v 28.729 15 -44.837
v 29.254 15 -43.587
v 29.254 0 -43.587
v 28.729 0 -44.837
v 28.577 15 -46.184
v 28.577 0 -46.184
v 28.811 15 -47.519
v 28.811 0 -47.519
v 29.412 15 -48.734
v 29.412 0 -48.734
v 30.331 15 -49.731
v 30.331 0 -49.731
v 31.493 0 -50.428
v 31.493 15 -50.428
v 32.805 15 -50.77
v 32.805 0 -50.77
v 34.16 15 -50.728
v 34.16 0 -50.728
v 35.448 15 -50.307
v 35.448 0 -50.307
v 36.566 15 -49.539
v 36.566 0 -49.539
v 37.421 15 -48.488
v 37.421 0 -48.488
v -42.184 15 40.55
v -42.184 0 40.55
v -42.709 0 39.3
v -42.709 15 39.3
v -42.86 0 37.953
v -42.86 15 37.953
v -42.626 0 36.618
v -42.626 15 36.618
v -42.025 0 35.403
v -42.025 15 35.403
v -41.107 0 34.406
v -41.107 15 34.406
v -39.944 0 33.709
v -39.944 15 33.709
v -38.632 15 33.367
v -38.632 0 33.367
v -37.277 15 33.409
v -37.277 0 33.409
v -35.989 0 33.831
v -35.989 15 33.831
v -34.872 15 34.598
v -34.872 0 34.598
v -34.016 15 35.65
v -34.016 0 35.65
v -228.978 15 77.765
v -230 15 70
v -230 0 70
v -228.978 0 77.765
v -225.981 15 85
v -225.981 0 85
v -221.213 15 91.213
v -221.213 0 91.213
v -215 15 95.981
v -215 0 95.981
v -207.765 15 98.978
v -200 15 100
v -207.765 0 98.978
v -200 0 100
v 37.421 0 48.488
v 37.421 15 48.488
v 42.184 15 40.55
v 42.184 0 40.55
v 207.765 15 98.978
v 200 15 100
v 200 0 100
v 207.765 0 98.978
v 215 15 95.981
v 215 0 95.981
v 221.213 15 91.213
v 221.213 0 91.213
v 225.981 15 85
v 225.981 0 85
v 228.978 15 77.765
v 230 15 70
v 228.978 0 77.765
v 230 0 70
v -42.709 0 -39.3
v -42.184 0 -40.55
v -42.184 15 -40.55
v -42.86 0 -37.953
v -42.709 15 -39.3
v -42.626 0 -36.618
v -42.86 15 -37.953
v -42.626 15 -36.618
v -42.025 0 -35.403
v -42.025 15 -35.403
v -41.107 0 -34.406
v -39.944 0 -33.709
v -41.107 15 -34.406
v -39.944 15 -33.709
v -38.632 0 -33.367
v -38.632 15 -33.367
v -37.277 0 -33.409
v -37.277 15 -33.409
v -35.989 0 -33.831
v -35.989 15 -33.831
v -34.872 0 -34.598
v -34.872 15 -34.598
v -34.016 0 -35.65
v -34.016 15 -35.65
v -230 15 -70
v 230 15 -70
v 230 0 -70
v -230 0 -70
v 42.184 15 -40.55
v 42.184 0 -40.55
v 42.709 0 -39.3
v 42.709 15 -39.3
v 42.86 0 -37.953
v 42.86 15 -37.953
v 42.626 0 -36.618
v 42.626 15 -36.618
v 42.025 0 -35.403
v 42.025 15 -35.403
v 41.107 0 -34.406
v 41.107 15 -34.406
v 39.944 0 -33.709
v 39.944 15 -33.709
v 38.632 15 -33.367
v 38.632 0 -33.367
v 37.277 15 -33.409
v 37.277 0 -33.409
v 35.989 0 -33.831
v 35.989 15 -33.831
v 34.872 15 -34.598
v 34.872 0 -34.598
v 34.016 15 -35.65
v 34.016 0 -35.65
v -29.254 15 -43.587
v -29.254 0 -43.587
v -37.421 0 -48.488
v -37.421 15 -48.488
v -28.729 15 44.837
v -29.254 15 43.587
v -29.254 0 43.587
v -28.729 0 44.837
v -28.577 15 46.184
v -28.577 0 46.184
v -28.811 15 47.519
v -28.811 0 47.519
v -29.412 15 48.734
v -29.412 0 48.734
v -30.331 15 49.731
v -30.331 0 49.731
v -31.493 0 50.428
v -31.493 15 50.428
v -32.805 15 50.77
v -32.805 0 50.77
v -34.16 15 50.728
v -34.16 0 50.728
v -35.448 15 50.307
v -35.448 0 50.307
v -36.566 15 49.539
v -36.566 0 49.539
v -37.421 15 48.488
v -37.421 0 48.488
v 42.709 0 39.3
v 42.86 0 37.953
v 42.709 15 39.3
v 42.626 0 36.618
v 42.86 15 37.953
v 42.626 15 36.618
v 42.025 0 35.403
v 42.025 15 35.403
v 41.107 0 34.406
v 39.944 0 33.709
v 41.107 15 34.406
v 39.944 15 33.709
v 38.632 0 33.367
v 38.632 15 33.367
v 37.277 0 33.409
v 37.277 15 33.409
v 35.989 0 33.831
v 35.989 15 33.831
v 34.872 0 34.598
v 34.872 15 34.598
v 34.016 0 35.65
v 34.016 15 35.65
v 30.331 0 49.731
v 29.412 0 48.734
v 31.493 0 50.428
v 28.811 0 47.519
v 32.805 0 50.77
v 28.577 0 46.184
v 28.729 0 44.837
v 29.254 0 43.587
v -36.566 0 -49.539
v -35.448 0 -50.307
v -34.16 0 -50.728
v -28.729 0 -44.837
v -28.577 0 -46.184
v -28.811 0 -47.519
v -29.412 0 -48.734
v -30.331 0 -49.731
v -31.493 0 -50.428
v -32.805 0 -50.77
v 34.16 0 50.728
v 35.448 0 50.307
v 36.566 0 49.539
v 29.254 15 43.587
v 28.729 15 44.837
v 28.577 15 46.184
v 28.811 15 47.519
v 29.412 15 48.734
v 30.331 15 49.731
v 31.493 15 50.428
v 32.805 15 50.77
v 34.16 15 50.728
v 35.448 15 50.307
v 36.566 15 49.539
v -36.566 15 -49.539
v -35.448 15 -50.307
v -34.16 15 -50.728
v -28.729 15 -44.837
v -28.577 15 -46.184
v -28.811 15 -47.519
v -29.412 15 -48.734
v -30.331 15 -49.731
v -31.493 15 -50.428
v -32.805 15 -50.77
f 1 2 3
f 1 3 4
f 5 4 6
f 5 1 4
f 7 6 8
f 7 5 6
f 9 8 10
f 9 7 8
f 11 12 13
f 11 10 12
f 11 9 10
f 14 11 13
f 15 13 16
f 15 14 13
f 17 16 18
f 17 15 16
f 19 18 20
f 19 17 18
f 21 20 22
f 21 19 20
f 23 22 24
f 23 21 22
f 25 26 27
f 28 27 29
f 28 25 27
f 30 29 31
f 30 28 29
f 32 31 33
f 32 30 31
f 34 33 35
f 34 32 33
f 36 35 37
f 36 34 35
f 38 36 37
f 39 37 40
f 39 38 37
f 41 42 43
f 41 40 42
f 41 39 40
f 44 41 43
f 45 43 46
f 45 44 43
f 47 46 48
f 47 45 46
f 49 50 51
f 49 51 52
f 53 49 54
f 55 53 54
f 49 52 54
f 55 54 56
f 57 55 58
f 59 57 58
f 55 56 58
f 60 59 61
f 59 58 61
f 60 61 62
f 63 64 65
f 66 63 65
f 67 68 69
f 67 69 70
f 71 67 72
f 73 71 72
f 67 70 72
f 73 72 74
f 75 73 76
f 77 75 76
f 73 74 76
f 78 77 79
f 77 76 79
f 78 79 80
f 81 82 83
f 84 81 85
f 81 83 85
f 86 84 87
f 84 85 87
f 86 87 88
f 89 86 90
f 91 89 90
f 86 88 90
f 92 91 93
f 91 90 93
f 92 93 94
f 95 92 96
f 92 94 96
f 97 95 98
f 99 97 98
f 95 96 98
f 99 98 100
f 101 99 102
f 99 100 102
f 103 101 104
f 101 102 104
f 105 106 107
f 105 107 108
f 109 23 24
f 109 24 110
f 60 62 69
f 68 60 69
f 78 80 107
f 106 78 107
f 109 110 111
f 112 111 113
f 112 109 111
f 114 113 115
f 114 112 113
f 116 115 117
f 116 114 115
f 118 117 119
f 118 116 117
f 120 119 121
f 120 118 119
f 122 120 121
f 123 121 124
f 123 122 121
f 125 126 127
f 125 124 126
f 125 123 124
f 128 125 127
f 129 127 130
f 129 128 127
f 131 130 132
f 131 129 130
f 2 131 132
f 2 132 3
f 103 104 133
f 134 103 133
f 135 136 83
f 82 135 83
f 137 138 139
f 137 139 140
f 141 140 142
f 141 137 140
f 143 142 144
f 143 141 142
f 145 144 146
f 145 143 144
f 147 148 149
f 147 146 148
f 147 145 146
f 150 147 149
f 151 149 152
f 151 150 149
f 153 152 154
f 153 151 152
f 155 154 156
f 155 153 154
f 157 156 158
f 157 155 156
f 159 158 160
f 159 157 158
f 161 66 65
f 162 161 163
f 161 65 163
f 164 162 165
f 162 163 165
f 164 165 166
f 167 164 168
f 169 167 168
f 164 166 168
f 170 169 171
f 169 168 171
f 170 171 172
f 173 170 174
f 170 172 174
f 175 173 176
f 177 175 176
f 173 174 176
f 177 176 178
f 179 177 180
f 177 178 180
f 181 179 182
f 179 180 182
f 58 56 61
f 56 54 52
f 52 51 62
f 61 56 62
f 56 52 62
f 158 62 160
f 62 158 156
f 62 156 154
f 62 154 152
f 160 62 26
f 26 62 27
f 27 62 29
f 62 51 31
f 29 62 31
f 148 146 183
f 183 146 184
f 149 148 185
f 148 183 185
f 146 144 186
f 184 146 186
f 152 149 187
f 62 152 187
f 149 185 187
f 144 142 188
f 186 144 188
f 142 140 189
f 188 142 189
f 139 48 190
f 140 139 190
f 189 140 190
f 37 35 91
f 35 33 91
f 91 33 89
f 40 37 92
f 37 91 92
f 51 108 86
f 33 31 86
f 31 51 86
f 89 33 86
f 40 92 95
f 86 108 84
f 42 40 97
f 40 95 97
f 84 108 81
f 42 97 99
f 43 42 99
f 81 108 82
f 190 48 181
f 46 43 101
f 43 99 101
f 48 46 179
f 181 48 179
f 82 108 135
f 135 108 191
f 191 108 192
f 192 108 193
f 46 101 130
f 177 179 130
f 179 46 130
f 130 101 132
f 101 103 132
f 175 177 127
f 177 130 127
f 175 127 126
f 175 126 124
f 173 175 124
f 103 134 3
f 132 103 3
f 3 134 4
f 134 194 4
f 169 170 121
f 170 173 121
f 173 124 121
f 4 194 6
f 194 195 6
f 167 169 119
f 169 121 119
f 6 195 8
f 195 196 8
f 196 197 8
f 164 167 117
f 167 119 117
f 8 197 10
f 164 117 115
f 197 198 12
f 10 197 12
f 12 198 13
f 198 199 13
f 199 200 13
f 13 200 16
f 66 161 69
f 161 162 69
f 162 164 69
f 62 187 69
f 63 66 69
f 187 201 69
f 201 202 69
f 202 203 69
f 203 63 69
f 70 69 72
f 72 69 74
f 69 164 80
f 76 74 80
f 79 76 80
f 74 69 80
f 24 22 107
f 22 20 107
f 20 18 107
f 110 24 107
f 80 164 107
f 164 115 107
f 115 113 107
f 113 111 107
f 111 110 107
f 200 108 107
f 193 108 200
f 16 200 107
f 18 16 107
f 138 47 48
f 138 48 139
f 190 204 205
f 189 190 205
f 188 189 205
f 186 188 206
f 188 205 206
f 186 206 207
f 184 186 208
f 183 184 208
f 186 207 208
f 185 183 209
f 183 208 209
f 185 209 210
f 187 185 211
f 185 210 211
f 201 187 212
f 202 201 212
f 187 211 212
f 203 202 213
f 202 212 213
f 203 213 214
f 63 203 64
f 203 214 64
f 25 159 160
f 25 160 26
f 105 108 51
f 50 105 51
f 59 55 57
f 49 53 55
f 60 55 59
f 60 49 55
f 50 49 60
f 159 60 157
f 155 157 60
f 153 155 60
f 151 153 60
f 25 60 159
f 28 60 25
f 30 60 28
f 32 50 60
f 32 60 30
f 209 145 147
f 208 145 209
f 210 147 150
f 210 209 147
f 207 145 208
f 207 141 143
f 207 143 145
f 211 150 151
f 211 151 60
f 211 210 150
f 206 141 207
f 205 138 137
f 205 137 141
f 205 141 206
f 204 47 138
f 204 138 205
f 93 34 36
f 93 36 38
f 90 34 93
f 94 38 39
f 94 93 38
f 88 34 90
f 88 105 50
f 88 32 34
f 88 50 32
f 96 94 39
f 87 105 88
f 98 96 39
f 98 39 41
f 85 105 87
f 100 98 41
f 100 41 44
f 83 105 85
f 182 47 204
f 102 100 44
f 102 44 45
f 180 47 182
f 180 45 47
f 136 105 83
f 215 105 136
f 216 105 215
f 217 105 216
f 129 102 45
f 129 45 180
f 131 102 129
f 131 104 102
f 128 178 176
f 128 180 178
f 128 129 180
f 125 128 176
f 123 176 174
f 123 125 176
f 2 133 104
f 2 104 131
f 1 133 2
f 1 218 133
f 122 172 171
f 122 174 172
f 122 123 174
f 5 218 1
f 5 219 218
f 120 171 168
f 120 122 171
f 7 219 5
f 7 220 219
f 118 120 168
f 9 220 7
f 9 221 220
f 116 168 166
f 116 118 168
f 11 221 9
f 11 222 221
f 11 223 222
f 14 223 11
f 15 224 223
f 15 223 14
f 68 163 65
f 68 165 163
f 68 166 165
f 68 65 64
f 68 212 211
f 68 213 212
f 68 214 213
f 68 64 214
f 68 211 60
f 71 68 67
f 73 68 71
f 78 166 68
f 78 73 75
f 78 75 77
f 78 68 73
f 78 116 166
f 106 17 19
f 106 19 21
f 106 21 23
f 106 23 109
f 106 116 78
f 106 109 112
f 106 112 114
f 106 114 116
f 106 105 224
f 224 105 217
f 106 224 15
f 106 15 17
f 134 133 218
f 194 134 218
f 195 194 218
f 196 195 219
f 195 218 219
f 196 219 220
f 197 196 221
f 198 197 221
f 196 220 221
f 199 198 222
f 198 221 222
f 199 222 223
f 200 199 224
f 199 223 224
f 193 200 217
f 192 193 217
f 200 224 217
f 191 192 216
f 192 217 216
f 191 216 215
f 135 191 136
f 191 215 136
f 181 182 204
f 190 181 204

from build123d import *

# Parameters (mm, degrees)
BOSS_EXTRUDE1_DEPTH = 15
CUT_EXTRUDE2_DEPTH  = 16
SKETCH4_W           = 524.5681158
SKETCH4_H           = 94.971164408
CUT_EXTRUDE3_DEPTH  = 30


with BuildPart() as part:
    # Sketch1 → Boss-Extrude1 (new body)
    with BuildSketch(Plane(origin=(0, 0, 0), x_dir=(1, 0, 0), z_dir=(0, 1, 0))):
        with BuildLine():
            Line((-200, -100), (200, -100))
            ThreePointArc((200, -100), (221.213203436, -91.213203436), (230, -70))
            Line((230, -70), (230, 100))
            Line((230, 100), (-230, 100))
            Line((-230, 100), (-230, -70))
            ThreePointArc((-230, -70), (-221.213203436, -91.213203436), (-200, -100))
        make_face()
    extrude(amount=BOSS_EXTRUDE1_DEPTH)

    # Sketch3 → Cut-Extrude2 (cut, through all)
    with BuildSketch(Plane(origin=(0, 15, 0), x_dir=(1, 0, 0), z_dir=(0, 1, 0))):
        with BuildLine():
            Line((-2466.524123707, -5837.229065469), (-2474.461623707, -5841.991565469))
            ThreePointArc((-2474.461623707, -5841.991565469), (-2480.995719801, -5840.358041446), (-2479.362195777, -5833.823945352))
            Line((-2479.362195777, -5833.823945352), (-2471.424695777, -5829.061445352))
            ThreePointArc((-2471.424695777, -5829.061445352), (-2464.890599684, -5830.694969376), (-2466.524123707, -5837.229065469))
        make_face()
        with BuildLine():
            Line((-2466.524123707, -5905.261445352), (-2474.461623707, -5900.498945352))
            ThreePointArc((-2474.461623707, -5900.498945352), (-2480.995719801, -5902.132469376), (-2479.362195777, -5908.666565469))
            Line((-2479.362195777, -5908.666565469), (-2471.424695777, -5913.429065469))
            ThreePointArc((-2471.424695777, -5913.429065469), (-2464.890599684, -5911.795541446), (-2466.524123707, -5905.261445352))
        make_face()
        with BuildLine():
            Line((-2395.224695777, -5837.229065469), (-2387.287195777, -5841.991565469))
            ThreePointArc((-2387.287195777, -5841.991565469), (-2380.753099684, -5840.358041446), (-2382.386623707, -5833.823945352))
            Line((-2382.386623707, -5833.823945352), (-2390.324123707, -5829.061445352))
            ThreePointArc((-2390.324123707, -5829.061445352), (-2396.858219801, -5830.694969376), (-2395.224695777, -5837.229065469))
        make_face()
        with BuildLine():
            Line((-2395.224695777, -5905.261445352), (-2387.287195777, -5900.498945352))
            ThreePointArc((-2387.287195777, -5900.498945352), (-2380.753099684, -5902.132469376), (-2382.386623707, -5908.666565469))
            Line((-2382.386623707, -5908.666565469), (-2390.324123707, -5913.429065469))
            ThreePointArc((-2390.324123707, -5913.429065469), (-2396.858219801, -5911.795541446), (-2395.224695777, -5905.261445352))
        make_face()
        with BuildLine():
            Line((-34.016189941, -35.649713965), (-29.253689941, -43.587213965))
            ThreePointArc((-29.253689941, -43.587213965), (-30.887213965, -50.121310059), (-37.421310059, -48.487786035))
            Line((-37.421310059, -48.487786035), (-42.183810059, -40.550286035))
            ThreePointArc((-42.183810059, -40.550286035), (-40.550286035, -34.016189941), (-34.016189941, -35.649713965))
        make_face()
        with BuildLine():
            Line((34.016189941, -35.649713965), (29.253689941, -43.587213965))
            ThreePointArc((29.253689941, -43.587213965), (30.887213965, -50.121310059), (37.421310059, -48.487786035))
            Line((37.421310059, -48.487786035), (42.183810059, -40.550286035))
            ThreePointArc((42.183810059, -40.550286035), (40.550286035, -34.016189941), (34.016189941, -35.649713965))
        make_face()
        with BuildLine():
            Line((-34.016189941, 35.649713965), (-29.253689941, 43.587213965))
            ThreePointArc((-29.253689941, 43.587213965), (-30.887213965, 50.121310059), (-37.421310059, 48.487786035))
            Line((-37.421310059, 48.487786035), (-42.183810059, 40.550286035))
            ThreePointArc((-42.183810059, 40.550286035), (-40.550286035, 34.016189941), (-34.016189941, 35.649713965))
        make_face()
        with BuildLine():
            Line((34.016189941, 35.649713965), (29.253689941, 43.587213965))
            ThreePointArc((29.253689941, 43.587213965), (30.887213965, 50.121310059), (37.421310059, 48.487786035))
            Line((37.421310059, 48.487786035), (42.183810059, 40.550286035))
            ThreePointArc((42.183810059, 40.550286035), (40.550286035, 34.016189941), (34.016189941, 35.649713965))
        make_face()
    extrude(amount=-CUT_EXTRUDE2_DEPTH, mode=Mode.SUBTRACT)

    # Sketch4 → Cut-Extrude3 (cut)
    with BuildSketch(Plane(origin=(0, 0, -100), x_dir=(-1, 0, 0), z_dir=(0, 0, -1))):
        Rectangle(SKETCH4_W, SKETCH4_H)
    extrude(amount=-CUT_EXTRUDE3_DEPTH, mode=Mode.SUBTRACT)


solid = part.part
